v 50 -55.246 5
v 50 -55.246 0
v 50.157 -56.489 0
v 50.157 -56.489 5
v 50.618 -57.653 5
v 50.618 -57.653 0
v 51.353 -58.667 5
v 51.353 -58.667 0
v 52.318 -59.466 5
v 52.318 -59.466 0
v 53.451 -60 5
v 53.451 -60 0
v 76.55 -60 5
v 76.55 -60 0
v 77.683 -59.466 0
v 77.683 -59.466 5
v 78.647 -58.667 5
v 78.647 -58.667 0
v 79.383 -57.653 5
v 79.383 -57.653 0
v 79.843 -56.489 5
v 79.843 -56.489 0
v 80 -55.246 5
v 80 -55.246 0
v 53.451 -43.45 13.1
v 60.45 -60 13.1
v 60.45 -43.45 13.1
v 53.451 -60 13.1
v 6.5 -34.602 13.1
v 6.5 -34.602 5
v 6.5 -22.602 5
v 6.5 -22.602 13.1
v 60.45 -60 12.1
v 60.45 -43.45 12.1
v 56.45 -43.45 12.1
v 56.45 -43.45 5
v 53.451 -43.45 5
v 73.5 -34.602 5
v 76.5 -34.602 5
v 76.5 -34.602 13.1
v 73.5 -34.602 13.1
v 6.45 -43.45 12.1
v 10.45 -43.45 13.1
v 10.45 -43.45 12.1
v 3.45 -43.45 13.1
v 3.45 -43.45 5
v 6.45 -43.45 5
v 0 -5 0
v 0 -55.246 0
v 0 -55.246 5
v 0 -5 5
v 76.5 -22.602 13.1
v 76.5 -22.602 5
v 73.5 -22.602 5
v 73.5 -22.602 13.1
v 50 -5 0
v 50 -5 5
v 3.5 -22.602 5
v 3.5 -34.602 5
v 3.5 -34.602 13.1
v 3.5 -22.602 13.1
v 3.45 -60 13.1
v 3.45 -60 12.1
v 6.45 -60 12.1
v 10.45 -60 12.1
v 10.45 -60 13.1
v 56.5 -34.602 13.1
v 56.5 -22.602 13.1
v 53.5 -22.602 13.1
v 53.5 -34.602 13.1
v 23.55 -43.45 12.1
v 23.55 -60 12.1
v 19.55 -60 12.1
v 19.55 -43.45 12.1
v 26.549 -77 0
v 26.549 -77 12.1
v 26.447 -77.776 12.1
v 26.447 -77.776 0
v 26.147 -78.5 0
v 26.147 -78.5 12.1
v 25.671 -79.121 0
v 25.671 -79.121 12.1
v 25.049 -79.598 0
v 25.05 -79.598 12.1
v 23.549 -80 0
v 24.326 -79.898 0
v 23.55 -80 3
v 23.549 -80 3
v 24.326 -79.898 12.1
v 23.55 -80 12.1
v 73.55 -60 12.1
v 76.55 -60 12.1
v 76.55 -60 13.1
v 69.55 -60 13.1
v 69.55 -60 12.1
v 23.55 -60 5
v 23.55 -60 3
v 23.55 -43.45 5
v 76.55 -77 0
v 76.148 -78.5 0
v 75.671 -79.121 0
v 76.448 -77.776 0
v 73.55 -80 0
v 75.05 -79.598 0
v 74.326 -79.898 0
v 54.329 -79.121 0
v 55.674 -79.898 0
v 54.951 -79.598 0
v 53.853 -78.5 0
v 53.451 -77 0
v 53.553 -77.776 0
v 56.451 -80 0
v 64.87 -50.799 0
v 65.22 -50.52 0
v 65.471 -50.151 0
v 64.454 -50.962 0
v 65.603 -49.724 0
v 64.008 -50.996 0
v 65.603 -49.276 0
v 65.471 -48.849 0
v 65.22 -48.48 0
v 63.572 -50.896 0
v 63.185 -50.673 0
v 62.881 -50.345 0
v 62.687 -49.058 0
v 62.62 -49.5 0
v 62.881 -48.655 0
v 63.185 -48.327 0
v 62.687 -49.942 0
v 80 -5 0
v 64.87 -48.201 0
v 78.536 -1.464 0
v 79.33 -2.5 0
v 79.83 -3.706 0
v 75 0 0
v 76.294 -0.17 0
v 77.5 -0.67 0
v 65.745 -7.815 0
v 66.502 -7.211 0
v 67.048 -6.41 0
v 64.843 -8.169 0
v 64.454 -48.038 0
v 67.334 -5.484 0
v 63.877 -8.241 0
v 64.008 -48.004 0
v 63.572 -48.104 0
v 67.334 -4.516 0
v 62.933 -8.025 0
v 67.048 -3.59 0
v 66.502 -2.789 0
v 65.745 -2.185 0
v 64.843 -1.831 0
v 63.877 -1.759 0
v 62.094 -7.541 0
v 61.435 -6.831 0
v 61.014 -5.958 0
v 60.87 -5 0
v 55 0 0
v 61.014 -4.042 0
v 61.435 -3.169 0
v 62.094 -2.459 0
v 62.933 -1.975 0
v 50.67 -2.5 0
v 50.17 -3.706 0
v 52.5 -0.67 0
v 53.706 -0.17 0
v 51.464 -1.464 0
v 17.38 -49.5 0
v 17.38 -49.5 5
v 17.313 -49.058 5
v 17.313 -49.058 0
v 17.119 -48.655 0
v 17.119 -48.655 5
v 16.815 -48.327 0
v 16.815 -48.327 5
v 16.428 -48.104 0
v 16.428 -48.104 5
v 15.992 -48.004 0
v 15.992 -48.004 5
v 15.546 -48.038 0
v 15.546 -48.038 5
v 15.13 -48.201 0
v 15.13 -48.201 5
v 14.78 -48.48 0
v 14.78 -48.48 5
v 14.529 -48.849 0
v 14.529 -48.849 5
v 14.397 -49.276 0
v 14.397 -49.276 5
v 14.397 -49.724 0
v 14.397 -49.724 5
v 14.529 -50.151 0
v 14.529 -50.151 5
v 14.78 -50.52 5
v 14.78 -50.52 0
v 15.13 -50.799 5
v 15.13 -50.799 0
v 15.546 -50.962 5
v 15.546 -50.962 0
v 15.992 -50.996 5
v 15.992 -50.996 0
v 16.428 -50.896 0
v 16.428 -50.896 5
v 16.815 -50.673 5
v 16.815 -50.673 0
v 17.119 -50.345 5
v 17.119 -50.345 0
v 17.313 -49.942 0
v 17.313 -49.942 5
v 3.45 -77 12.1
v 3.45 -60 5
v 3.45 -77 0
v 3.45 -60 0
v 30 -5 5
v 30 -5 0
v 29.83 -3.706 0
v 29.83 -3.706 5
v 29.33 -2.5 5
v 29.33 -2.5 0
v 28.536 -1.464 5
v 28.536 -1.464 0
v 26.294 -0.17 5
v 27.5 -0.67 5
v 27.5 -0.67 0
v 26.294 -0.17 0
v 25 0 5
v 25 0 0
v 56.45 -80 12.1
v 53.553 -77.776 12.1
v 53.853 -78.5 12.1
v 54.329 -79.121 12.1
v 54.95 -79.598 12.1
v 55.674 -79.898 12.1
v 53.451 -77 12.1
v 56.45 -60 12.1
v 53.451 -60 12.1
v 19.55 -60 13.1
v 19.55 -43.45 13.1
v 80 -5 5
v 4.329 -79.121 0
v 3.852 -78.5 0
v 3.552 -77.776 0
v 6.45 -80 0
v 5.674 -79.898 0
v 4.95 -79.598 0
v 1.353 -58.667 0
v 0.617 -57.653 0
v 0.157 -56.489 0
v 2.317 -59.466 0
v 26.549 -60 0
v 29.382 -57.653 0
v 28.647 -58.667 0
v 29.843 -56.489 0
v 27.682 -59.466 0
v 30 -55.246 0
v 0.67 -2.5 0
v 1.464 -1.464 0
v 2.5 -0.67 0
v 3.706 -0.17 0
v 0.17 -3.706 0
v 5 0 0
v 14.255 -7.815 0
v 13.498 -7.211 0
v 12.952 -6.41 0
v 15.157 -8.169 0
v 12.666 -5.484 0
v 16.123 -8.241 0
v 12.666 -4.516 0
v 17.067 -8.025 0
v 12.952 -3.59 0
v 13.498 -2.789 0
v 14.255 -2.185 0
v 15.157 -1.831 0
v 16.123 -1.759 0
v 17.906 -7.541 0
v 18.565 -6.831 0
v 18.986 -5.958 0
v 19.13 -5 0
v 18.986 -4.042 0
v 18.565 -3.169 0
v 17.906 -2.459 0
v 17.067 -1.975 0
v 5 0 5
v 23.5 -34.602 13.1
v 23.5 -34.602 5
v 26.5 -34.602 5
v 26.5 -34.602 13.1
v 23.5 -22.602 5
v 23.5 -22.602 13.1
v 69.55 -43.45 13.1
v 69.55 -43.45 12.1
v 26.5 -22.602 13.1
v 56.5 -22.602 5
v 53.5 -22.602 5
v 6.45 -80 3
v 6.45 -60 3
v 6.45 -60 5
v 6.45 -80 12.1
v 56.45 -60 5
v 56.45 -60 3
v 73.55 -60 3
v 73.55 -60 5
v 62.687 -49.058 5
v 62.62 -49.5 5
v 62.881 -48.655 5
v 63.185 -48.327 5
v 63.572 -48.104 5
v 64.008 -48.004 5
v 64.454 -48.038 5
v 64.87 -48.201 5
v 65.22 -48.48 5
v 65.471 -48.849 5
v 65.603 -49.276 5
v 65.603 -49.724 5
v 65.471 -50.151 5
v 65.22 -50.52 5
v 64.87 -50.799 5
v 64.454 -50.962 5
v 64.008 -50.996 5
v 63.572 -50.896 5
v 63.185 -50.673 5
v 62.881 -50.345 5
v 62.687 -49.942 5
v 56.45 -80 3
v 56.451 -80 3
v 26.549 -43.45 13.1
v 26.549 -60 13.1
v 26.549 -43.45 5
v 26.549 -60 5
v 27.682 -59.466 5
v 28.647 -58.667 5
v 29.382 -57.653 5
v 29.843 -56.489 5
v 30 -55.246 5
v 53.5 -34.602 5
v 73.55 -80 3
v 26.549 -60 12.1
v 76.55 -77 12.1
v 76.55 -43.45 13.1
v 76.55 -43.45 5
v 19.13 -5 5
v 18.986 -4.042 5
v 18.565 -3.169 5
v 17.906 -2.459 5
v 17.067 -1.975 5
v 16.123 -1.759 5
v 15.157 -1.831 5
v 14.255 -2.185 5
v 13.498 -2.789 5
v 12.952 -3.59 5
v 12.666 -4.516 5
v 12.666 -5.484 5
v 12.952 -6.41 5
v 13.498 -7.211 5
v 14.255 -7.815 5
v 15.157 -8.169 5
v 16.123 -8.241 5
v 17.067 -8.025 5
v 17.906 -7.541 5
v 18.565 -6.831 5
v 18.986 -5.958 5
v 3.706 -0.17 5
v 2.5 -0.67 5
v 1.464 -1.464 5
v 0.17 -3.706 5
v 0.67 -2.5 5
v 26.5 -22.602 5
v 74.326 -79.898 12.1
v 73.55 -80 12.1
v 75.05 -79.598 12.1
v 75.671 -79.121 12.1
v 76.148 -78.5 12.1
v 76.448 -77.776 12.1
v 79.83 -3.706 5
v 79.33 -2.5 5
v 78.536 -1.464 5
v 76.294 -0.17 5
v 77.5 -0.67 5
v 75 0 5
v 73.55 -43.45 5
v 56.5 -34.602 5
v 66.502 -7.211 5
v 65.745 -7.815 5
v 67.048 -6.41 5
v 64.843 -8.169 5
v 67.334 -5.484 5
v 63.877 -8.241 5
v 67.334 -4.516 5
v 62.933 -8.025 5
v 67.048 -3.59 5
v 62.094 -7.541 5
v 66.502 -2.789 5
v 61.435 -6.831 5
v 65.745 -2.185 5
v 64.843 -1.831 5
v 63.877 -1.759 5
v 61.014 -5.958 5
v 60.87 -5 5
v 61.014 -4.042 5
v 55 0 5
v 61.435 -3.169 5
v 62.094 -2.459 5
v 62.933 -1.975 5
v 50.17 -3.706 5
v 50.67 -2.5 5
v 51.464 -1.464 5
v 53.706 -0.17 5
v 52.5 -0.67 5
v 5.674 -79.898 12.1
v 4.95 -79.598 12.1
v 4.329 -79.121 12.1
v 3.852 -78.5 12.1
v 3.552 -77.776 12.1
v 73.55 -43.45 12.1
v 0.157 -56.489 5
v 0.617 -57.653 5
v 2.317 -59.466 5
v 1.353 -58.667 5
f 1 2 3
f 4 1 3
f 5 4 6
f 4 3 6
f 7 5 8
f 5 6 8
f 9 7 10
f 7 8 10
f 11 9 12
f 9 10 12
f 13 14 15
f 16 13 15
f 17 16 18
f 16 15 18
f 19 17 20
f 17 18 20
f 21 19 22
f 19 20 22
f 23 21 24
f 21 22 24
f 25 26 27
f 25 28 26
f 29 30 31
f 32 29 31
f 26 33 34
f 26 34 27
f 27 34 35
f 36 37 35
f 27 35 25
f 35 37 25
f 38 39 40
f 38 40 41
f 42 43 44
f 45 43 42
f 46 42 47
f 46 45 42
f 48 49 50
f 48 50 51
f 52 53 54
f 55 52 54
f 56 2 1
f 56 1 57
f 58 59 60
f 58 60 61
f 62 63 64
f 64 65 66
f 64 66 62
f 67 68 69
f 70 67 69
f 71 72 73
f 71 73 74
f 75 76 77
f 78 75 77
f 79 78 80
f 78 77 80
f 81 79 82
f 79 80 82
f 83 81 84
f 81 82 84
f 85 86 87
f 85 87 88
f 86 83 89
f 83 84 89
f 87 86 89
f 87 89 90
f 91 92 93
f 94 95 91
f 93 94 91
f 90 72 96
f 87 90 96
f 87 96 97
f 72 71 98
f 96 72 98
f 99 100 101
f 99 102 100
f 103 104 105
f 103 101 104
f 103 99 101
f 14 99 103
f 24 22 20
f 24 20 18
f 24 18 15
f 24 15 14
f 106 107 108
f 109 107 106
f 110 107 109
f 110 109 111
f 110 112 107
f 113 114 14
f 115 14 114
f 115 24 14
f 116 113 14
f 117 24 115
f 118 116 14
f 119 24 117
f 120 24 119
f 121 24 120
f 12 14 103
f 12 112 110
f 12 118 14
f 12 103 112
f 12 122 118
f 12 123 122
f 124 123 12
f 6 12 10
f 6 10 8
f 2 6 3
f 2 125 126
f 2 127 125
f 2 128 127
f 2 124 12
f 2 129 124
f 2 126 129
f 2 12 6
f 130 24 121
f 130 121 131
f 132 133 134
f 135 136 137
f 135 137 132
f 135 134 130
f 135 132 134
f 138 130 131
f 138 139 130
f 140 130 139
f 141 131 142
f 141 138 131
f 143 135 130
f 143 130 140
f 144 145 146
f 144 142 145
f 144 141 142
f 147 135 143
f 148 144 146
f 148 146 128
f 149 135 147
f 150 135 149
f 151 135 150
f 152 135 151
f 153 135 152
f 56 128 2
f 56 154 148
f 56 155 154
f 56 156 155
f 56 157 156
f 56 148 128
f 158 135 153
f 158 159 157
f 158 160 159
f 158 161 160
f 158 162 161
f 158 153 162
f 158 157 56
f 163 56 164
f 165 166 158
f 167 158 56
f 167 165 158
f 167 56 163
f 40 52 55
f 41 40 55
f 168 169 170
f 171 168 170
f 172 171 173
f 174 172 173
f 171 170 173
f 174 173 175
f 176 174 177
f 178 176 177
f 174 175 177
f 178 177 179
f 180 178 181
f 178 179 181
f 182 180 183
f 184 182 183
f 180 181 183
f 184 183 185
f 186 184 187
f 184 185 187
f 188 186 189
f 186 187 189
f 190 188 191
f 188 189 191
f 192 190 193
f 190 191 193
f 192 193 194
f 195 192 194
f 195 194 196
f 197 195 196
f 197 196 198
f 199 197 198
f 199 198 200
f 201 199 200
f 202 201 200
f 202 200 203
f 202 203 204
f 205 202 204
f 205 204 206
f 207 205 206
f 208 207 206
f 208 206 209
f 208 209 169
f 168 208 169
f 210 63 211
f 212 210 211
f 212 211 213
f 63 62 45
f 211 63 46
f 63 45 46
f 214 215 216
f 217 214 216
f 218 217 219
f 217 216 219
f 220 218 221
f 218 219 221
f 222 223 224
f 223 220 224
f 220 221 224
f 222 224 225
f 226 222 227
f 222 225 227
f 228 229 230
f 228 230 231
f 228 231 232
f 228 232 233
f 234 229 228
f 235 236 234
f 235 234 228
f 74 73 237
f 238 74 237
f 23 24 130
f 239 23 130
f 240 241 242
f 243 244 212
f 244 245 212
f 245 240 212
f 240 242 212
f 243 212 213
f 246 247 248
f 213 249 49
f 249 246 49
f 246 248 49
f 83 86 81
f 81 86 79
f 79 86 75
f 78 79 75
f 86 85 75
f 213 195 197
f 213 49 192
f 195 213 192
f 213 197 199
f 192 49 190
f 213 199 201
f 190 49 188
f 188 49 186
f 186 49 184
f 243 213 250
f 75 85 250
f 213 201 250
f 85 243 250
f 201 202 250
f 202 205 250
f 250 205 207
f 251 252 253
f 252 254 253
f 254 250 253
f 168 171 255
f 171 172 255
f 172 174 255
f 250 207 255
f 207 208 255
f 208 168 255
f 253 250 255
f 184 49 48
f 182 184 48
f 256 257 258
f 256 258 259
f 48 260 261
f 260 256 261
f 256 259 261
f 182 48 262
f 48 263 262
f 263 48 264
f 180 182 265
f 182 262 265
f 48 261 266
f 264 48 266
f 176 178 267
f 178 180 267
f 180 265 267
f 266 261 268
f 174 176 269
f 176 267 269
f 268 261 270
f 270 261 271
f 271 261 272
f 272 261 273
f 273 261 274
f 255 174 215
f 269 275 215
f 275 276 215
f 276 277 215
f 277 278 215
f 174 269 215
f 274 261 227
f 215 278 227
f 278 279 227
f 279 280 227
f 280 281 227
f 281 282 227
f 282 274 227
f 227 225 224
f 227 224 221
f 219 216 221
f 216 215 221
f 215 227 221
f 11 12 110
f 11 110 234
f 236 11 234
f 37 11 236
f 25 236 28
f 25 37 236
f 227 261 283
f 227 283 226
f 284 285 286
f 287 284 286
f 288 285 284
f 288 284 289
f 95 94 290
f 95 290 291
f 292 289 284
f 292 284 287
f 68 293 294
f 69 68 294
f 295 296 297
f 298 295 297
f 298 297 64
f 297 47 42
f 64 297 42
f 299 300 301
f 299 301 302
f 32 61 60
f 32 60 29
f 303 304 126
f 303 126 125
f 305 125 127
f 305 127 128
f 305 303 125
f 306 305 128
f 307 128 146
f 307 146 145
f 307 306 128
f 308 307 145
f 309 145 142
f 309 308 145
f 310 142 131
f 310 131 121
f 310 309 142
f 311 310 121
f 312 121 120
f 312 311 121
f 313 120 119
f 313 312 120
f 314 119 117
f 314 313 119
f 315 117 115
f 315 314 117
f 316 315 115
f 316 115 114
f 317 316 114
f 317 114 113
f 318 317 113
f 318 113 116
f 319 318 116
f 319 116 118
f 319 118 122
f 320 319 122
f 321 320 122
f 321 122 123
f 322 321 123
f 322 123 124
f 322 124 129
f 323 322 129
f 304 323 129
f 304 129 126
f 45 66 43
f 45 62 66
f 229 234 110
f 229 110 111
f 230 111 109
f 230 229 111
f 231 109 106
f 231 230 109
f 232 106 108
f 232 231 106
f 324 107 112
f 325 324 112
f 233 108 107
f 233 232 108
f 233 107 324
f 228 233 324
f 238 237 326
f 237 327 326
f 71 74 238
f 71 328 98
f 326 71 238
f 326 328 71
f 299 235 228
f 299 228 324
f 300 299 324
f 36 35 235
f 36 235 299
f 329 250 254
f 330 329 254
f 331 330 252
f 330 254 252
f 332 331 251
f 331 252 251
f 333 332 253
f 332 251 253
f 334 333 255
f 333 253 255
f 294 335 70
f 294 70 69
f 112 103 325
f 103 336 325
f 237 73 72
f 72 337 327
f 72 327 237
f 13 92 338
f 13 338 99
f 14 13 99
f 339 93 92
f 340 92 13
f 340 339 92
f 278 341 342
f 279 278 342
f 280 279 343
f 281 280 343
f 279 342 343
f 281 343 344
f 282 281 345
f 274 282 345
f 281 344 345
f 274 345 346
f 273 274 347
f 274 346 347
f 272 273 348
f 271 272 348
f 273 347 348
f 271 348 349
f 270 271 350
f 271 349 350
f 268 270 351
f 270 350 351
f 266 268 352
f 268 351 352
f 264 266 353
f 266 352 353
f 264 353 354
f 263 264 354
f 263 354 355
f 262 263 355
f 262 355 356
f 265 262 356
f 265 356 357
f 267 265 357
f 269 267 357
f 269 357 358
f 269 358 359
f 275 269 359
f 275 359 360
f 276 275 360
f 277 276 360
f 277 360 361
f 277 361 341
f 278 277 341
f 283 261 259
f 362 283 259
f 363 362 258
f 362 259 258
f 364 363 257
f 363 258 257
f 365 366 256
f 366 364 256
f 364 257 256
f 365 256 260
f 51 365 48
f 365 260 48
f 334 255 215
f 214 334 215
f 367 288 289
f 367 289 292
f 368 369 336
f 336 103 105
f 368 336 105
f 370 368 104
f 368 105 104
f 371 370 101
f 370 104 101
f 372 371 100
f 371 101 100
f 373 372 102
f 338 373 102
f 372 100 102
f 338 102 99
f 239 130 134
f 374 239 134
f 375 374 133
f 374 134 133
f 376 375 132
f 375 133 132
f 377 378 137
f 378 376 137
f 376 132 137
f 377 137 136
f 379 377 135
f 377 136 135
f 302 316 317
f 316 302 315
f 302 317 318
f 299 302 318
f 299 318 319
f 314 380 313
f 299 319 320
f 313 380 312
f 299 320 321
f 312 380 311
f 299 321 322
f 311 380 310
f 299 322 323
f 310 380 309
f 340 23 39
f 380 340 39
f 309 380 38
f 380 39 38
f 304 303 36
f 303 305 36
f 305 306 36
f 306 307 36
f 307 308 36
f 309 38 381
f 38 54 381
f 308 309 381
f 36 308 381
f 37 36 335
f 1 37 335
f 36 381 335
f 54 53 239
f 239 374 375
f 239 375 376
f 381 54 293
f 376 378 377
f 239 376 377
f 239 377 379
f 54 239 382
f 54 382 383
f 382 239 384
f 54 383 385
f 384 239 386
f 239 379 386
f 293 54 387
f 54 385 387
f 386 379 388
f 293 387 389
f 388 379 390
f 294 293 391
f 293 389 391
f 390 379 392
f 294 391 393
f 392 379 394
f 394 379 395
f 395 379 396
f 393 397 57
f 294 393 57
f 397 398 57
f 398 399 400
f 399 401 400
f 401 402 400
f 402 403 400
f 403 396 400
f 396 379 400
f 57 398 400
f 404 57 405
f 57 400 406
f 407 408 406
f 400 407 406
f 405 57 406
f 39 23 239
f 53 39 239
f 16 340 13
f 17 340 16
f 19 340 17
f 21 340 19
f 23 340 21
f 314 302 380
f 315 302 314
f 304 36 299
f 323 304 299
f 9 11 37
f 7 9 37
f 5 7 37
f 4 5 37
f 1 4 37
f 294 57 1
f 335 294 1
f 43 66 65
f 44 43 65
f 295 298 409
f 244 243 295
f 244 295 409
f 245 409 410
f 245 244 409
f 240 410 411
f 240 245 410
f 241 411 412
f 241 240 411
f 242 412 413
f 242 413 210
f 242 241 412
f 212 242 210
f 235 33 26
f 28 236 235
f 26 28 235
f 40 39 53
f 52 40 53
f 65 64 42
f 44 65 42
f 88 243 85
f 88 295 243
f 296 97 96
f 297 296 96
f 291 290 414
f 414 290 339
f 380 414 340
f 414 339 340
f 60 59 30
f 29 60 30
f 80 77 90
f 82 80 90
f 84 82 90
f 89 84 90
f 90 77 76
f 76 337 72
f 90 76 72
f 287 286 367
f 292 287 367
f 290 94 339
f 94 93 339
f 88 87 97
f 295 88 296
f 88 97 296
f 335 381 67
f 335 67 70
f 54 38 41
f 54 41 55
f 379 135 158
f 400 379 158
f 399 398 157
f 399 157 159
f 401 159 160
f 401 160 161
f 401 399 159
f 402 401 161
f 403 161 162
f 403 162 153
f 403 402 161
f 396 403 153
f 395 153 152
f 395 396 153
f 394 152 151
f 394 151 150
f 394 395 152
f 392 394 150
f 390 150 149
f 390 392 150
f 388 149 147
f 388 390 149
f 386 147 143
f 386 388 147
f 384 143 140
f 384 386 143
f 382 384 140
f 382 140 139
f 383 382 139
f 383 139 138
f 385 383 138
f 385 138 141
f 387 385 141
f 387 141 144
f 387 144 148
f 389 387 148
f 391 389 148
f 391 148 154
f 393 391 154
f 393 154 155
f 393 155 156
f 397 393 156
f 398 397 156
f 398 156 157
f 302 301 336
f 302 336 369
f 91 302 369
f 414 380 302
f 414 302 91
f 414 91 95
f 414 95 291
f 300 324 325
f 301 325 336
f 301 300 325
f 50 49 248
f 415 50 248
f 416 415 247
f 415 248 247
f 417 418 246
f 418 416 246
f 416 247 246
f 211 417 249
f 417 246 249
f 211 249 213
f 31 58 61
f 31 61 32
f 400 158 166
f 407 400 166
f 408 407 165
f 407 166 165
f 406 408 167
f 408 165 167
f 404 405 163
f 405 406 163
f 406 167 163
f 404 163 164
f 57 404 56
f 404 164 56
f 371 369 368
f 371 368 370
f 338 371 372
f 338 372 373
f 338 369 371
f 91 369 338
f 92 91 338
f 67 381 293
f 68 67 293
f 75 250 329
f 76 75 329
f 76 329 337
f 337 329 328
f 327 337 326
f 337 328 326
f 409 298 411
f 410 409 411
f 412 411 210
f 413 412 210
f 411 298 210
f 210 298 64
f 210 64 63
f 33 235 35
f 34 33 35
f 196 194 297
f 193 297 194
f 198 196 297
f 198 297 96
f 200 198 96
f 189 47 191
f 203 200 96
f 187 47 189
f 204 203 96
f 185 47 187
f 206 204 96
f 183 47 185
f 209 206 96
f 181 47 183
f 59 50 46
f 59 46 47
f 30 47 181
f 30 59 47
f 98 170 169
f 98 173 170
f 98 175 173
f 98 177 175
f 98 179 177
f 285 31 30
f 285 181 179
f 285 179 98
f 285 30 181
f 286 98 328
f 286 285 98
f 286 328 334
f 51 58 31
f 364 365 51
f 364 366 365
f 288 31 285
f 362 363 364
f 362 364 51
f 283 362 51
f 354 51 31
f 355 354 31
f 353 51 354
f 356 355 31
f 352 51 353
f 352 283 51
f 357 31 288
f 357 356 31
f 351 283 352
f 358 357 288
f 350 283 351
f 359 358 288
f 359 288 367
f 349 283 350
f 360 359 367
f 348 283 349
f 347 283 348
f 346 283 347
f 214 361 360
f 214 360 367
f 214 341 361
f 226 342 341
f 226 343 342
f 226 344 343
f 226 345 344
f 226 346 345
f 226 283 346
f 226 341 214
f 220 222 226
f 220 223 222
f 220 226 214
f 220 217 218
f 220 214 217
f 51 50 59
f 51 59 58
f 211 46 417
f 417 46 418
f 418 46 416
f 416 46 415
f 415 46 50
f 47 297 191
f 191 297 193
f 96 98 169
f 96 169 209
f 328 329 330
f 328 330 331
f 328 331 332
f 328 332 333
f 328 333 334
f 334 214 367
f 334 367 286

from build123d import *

# Parameters (mm, degrees)
SKETCH_1_W          = 30
SKETCH_1_H          = 60
EXTRUDE_1_DEPTH     = 5
SKETCH_2_R          = 3.25
SKETCH_2_R_2        = 1.5
CUT_EXTRUDE_1_DEPTH = 10
SKETCH_3_W          = 3
SKETCH_3_H          = 16.55
SKETCH_3_W_2        = 2.999297591
SKETCH_3_H_2        = 12
EXTRUDE_2_DEPTH     = 8.1
SKETCH_4_W          = 1
SKETCH_4_H          = 16.55
EXTRUDE_3_DEPTH     = 4
SKETCH_5_W          = 1
SKETCH_5_H          = 16.55
EXTRUDE_4_DEPTH     = 4
EXTRUDE_5_DEPTH     = 20
FILLET_3_R          = 5
FILLET_5_R          = 3
FILLET_6_R          = 5
FILLET_7_R          = 3


with BuildPart() as part:
    # 스케치1 → 보스-돌출1 (new body)
    with BuildSketch(Plane.XY):
        with Locations((15, -30)):
            Rectangle(SKETCH_1_W, SKETCH_1_H)
    extrude(amount=EXTRUDE_1_DEPTH)

    # 스케치2 → 컷-돌출1 (cut)
    with BuildSketch(Plane.XY.offset(5)):
        with Locations((15.88, -5)):
            Circle(SKETCH_2_R)
        with Locations((15.88, -49.5)):
            Circle(SKETCH_2_R_2)
    extrude(amount=-CUT_EXTRUDE_1_DEPTH, mode=Mode.SUBTRACT)

    # 스케치3 → 보스-돌출2 (add)
    with BuildSketch(Plane.XY.offset(5)):
        with Locations((4.95, -51.725)):
            Rectangle(SKETCH_3_W, SKETCH_3_H)
        with Locations((25.049648796, -51.725)):
            Rectangle(SKETCH_3_W_2, SKETCH_3_H)
        with Locations((5, -28.602177849)):
            Rectangle(SKETCH_3_W, SKETCH_3_H_2)
        with Locations((25, -28.602177849)):
            Rectangle(SKETCH_3_W, SKETCH_3_H_2)
    extrude(amount=EXTRUDE_2_DEPTH)

    # 스케치4 → 보스-돌출3 (add)
    with BuildSketch(Plane(origin=(6.45, 0, 0), x_dir=(0, 0, -1), z_dir=(1, 0, 0))):
        with Locations((-12.6, -51.725)):
            Rectangle(SKETCH_4_W, SKETCH_4_H)
    extrude(amount=EXTRUDE_3_DEPTH)

    # 스케치5 → 보스-돌출4 (add)
    with BuildSketch(Plane.ZY.offset(-23.55)):
        with Locations((12.6, -51.725)):
            Rectangle(SKETCH_5_W, SKETCH_5_H)
    extrude(amount=EXTRUDE_4_DEPTH)

    # 스케치6 → 보스-돌출5 (add)
    with BuildSketch(Plane.XZ.offset(60)):
        Polygon((3.45, 0), (26.549297591, 0), (26.549297591, 3), (26.549297591, 12.1), (23.55, 12.1), (23.55, 3), (6.45, 3), (6.45, 12.1), (3.45, 12.1), (3.45, 3), align=None)
    extrude(amount=EXTRUDE_5_DEPTH)


with BuildPart() as body_2:
    # 대칭 복사8: mirrored copy
    add(part.part.mirror(Plane(origin=(40, 0, 0), x_dir=(0, 0, 1), z_dir=(1, 0, 0))))

    # 필렛6
    # the kernel refuses this fillet: 5 mm, written as the material it takes off along each edge
    with BuildSketch(Plane(origin=(50, -60, -11.884779388), x_dir=(0, 1, 0), z_dir=(0, 0, 1))) as fillet_6_piece_1:
        with BuildLine():
            CenterArc((4.753911755, -5), FILLET_6_R, 90, 71.949235391)
            Line((0, -3.450702409), (-0.095078235, -3.419716457))
            ThreePointArc((-0.095078235, -3.419716457), (-0.1, -1.725351205), (-0.1, 0))
            Line((-0.1, 0), (0, 0.1))
            Line((0, 0.1), (4.753911755, 0.1))
            Line((4.753911755, 0.1), (4.753911755, 0))
        make_face()
    extrude(amount=28.769558776, mode=Mode.SUBTRACT)
    with BuildSketch(Plane(origin=(80, -60, -11.884206957), x_dir=(0, 1, 0), z_dir=(0, 0, 1))) as fillet_6_piece_2:
        with BuildLine():
            CenterArc((4.753682783, 5), FILLET_6_R, 198.059230491, 71.940769509)
            Line((0, 3.45), (-0.095073656, 3.419))
            ThreePointArc((-0.095073656, 3.419), (-0.1, 1.725), (-0.1, 0))
            Line((-0.1, 0), (0, -0.1))
            Line((0, -0.1), (4.753682783, -0.1))
            Line((4.753682783, -0.1), (4.753682783, 0))
        make_face()
    extrude(amount=28.768413914, mode=Mode.SUBTRACT)
    with BuildSketch(Plane(origin=(50, 0, -12.5), x_dir=(1, 0, 0), z_dir=(0, 0, 1))) as fillet_6_piece_3:
        with BuildLine():
            CenterArc((FILLET_6_R, -FILLET_6_R), FILLET_6_R, 90, 90)
            Line((0, -FILLET_6_R), (-FILLET_6_R * 0.02, -FILLET_6_R))
            Line((-FILLET_6_R * 0.02, -FILLET_6_R), (-FILLET_6_R * 0.02, FILLET_6_R * 0.02))
            Line((-FILLET_6_R * 0.02, FILLET_6_R * 0.02), (FILLET_6_R, FILLET_6_R * 0.02))
            Line((FILLET_6_R, FILLET_6_R * 0.02), (FILLET_6_R, 0))
        make_face()
    extrude(amount=30, mode=Mode.SUBTRACT)
    with BuildSketch(Plane(origin=(80, 0, -12.5), x_dir=(-1, 0, 0), z_dir=(0, 0, 1))) as fillet_6_piece_4:
        with BuildLine():
            CenterArc((FILLET_6_R, FILLET_6_R), FILLET_6_R, 180, 90)
            Line((0, FILLET_6_R), (-FILLET_6_R * 0.02, FILLET_6_R))
            Line((-FILLET_6_R * 0.02, FILLET_6_R), (-FILLET_6_R * 0.02, -FILLET_6_R * 0.02))
            Line((-FILLET_6_R * 0.02, -FILLET_6_R * 0.02), (FILLET_6_R, -FILLET_6_R * 0.02))
            Line((FILLET_6_R, -FILLET_6_R * 0.02), (FILLET_6_R, 0))
        make_face()
    extrude(amount=30, mode=Mode.SUBTRACT)

    # 필렛7
    fillet_7_edges = [body_2.edges().sort_by_distance(p)[0] for p in [
        (53.450702409, -80, 6.05),
        (76.55, -80, 6.05),
    ]]
    fillet(fillet_7_edges, radius=FILLET_7_R)


with BuildPart() as part_1:
    add(part.part)

    # 필렛3
    # the kernel refuses this fillet: 5 mm, written as the material it takes off along each edge
    with BuildSketch(Plane(origin=(30, -60, -11.884779388), x_dir=(0, 1, 0), z_dir=(0, 0, 1))) as fillet_3_piece_1:
        with BuildLine():
            CenterArc((4.753911755, 5), FILLET_3_R, 198.050764609, 71.949235391)
            Line((0, 3.450702409), (-0.095078235, 3.419716457))
            ThreePointArc((-0.095078235, 3.419716457), (-0.1, 1.725351205), (-0.1, 0))
            Line((-0.1, 0), (0, -0.1))
            Line((0, -0.1), (4.753911755, -0.1))
            Line((4.753911755, -0.1), (4.753911755, 0))
        make_face()
    extrude(amount=28.769558776, mode=Mode.SUBTRACT)
    with BuildSketch(Plane(origin=(0, -60, -11.884206957), x_dir=(0, 1, 0), z_dir=(0, 0, 1))) as fillet_3_piece_2:
        with BuildLine():
            CenterArc((4.753682783, -5), FILLET_3_R, 90, 71.940769509)
            Line((0, -3.45), (-0.095073656, -3.419))
            ThreePointArc((-0.095073656, -3.419), (-0.1, -1.725), (-0.1, 0))
            Line((-0.1, 0), (0, 0.1))
            Line((0, 0.1), (4.753682783, 0.1))
            Line((4.753682783, 0.1), (4.753682783, 0))
        make_face()
    extrude(amount=28.768413914, mode=Mode.SUBTRACT)
    with BuildSketch(Plane(origin=(30, 0, -12.5), x_dir=(-1, 0, 0), z_dir=(0, 0, 1))) as fillet_3_piece_3:
        with BuildLine():
            CenterArc((FILLET_3_R, FILLET_3_R), FILLET_3_R, 180, 90)
            Line((0, FILLET_3_R), (-FILLET_3_R * 0.02, FILLET_3_R))
            Line((-FILLET_3_R * 0.02, FILLET_3_R), (-FILLET_3_R * 0.02, -FILLET_3_R * 0.02))
            Line((-FILLET_3_R * 0.02, -FILLET_3_R * 0.02), (FILLET_3_R, -FILLET_3_R * 0.02))
            Line((FILLET_3_R, -FILLET_3_R * 0.02), (FILLET_3_R, 0))
        make_face()
    extrude(amount=30, mode=Mode.SUBTRACT)
    with BuildSketch(Plane(origin=(0, 0, -12.5), x_dir=(1, 0, 0), z_dir=(0, 0, 1))) as fillet_3_piece_4:
        with BuildLine():
            CenterArc((FILLET_3_R, -FILLET_3_R), FILLET_3_R, 90, 90)
            Line((0, -FILLET_3_R), (-FILLET_3_R * 0.02, -FILLET_3_R))
            Line((-FILLET_3_R * 0.02, -FILLET_3_R), (-FILLET_3_R * 0.02, FILLET_3_R * 0.02))
            Line((-FILLET_3_R * 0.02, FILLET_3_R * 0.02), (FILLET_3_R, FILLET_3_R * 0.02))
            Line((FILLET_3_R, FILLET_3_R * 0.02), (FILLET_3_R, 0))
        make_face()
    extrude(amount=30, mode=Mode.SUBTRACT)

    # 필렛5
    fillet_5_edges = [part_1.edges().sort_by_distance(p)[0] for p in [
        (3.45, -80, 6.05),
        (26.549297591, -80, 6.05),
    ]]
    fillet(fillet_5_edges, radius=FILLET_5_R)


solid = Compound([body_2.part, part_1.part])
